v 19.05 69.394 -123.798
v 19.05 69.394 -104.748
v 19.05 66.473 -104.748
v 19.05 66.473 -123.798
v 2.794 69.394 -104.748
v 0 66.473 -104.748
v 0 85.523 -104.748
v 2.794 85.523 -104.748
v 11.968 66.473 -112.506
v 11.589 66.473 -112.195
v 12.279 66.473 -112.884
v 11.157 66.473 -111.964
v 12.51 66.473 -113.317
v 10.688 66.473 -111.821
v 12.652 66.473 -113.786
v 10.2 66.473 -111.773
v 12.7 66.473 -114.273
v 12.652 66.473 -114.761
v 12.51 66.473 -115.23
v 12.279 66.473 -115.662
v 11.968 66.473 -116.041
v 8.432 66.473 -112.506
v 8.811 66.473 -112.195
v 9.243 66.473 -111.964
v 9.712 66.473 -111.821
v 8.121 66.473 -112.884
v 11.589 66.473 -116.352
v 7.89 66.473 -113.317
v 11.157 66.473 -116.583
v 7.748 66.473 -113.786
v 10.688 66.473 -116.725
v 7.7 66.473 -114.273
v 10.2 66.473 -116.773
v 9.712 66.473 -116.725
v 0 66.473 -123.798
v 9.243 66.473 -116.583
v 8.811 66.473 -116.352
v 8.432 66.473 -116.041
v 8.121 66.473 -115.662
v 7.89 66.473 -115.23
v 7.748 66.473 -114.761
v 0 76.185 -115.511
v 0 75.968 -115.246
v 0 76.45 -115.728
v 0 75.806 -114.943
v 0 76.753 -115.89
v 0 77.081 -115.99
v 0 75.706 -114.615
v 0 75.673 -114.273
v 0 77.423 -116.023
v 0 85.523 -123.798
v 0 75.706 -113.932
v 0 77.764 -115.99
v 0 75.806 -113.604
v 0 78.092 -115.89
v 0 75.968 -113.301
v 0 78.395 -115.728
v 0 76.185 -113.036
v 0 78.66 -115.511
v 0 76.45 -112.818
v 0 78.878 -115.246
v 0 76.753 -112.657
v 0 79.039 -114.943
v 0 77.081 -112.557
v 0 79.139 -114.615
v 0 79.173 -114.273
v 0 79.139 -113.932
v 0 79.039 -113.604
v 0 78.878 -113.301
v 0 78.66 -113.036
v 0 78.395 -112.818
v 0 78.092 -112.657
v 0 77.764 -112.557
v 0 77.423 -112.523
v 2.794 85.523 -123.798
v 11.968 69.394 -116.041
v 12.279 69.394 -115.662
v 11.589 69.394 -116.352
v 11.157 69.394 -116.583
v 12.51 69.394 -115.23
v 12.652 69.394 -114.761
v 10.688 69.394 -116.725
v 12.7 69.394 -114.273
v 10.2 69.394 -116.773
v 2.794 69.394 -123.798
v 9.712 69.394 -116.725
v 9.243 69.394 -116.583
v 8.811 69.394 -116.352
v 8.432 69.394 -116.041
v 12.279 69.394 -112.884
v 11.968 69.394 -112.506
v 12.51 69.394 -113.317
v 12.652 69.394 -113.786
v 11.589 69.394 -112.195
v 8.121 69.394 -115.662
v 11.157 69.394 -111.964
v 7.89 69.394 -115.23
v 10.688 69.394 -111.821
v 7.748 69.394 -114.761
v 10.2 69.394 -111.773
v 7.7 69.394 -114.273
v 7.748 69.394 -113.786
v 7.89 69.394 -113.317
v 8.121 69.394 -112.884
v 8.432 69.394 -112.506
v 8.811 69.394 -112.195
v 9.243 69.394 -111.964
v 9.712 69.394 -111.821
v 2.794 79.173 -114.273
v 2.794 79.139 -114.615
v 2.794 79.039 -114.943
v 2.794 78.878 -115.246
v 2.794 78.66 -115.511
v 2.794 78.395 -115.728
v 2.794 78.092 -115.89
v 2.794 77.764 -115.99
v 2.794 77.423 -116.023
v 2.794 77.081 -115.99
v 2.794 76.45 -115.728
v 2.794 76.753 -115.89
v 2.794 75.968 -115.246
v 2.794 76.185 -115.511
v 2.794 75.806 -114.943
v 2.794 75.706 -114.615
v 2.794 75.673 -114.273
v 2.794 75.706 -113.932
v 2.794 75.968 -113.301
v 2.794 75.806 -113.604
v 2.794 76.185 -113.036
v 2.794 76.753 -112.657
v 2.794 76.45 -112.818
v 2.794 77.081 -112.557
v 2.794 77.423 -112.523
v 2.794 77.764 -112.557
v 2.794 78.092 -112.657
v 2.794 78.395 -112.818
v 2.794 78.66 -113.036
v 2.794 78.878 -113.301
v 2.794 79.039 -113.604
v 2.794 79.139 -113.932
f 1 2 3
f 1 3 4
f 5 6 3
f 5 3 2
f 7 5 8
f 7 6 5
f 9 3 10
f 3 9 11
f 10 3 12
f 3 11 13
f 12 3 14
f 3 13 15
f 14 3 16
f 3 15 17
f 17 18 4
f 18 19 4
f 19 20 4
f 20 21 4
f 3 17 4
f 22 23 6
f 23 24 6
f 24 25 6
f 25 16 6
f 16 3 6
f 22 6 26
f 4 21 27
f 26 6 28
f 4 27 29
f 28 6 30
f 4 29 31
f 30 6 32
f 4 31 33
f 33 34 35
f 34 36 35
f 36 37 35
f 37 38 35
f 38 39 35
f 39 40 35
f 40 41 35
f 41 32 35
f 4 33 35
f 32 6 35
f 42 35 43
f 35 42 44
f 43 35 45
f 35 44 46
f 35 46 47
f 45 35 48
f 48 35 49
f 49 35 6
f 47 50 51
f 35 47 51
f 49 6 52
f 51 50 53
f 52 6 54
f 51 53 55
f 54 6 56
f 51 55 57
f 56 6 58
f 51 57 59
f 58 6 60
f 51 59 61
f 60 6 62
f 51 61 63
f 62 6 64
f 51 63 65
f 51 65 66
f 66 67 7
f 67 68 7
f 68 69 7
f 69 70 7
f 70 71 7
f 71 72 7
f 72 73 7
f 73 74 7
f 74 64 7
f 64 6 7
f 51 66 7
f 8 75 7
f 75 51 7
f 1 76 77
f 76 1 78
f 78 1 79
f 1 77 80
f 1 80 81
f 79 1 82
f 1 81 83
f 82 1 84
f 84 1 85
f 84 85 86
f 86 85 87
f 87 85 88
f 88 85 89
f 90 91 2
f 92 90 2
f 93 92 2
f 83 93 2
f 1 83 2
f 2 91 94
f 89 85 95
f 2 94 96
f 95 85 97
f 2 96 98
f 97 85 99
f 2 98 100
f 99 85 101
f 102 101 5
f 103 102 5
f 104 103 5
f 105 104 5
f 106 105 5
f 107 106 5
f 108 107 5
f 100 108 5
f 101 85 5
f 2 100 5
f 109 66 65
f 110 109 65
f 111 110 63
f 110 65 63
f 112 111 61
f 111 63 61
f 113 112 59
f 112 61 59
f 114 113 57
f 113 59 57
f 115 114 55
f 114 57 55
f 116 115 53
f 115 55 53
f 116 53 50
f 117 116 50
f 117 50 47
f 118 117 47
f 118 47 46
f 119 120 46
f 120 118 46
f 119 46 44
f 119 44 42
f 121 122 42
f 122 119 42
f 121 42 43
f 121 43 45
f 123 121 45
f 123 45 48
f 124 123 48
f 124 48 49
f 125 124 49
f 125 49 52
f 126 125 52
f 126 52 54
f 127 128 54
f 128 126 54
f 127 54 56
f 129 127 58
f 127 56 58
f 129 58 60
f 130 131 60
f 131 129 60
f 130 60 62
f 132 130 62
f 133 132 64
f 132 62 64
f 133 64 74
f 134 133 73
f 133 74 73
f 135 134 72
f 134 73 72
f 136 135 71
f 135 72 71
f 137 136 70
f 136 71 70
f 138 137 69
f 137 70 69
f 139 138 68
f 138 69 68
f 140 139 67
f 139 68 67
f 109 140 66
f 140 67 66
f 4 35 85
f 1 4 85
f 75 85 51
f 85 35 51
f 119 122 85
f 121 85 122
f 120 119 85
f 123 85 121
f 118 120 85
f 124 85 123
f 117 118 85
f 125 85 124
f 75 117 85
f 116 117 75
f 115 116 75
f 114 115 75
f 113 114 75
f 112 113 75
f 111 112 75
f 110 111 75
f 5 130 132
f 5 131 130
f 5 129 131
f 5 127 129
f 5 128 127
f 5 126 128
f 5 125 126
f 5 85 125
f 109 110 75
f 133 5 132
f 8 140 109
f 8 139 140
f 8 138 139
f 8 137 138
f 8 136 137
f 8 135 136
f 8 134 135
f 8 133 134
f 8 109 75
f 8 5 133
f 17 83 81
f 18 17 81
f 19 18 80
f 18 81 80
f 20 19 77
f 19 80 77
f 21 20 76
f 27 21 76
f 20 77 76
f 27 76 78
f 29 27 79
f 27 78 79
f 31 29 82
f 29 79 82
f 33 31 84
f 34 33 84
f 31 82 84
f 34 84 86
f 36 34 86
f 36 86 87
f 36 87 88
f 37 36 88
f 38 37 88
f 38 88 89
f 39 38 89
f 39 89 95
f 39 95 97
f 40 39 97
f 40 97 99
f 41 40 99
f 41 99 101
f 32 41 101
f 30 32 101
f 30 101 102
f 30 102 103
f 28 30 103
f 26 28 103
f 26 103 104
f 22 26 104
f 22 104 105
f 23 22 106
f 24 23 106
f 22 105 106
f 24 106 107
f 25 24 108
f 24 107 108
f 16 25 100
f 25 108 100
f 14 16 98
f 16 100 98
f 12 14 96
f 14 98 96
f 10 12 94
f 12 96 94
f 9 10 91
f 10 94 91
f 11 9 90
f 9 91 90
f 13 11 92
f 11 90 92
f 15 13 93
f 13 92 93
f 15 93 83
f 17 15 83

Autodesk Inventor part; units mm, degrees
ref_plane "YZ Plane" through (0, 0, 0) normal (1, 0, 0) x (0, 1, 0)
ref_plane "XZ Plane" through (0, 0, 0) normal (0, 1, 0) x (-1, 0, 0)
ref_plane "XY Plane" through (0, 0, 0) normal (0, 0, 1) x (1, 0, 0)
sketch "Sketch1" plane through (0, 0, 0) normal (1, 0, 0) x (0, 1, 0)
  circle A0 centre (77.4226, -114.2734) radius 1.75 projected
  line L0 (66.4726, -104.7484) -> (66.4726, -123.7984) projected
  line L1 (66.4726, -104.7484) -> (85.5226, -104.7484) projected
  line L2 (85.5226, -123.7984) -> (85.5226, -104.7484) projected
  line L3 (66.4726, -123.7984) -> (85.5226, -123.7984) projected
  point P0 (0, 0)
extrude "Extrusion1" add sketch "Sketch1" along normal blind 2.794
sketch "Sketch3" plane through (2.794, 0, 0) normal (1, 0, 0) x (0, 0, -1)
  line L0 (104.7484, 66.4726) -> (123.7984, 66.4726) projected
  line L1 (104.7484, 85.5226) -> (104.7484, 66.4726) projected
  line L2 (104.7484, 66.4726) -> (104.7484, 69.3936)
  line L3 (104.7484, 66.4726) -> (107.6694, 66.4726) construction
  line L4 (123.7984, 66.4726) -> (123.7984, 85.5226) projected
  line L5 (123.7984, 66.4726) -> (123.7984, 69.3936)
  line L6 (123.7984, 66.4726) -> (126.7194, 66.4726) construction
  line L7 (123.7984, 69.3936) -> (104.7484, 69.3936)
  point P0 (0, 0)
  dimension "d2" = 2.921
  dimension "d3" = 90
  dimension "d4" = 2.921
  dimension "d5" = 90
extrude "Extrusion2" add sketch "Sketch3" along normal blind 16.256
sketch "Sketch4" plane through (2.794, 69.3936, -104.7484) normal (0, 1, 0) x (1, 0, 0)
  line L0 (16.256, 19.05) -> (16.256, 0) construction
  line L1 (16.256, 0) -> (16.256, 19.05) construction
  line L2 (16.256, 9.525) -> (7.406, 9.525) construction
  circle A0 centre (7.406, 9.525) radius 2.5
  point P0 (-2.794, -104.7484)
  dimension "d8" = 8.85
  dimension "d9" = 5
extrude "Extrusion3" cut sketch "Sketch4" against normal blind 16.256
